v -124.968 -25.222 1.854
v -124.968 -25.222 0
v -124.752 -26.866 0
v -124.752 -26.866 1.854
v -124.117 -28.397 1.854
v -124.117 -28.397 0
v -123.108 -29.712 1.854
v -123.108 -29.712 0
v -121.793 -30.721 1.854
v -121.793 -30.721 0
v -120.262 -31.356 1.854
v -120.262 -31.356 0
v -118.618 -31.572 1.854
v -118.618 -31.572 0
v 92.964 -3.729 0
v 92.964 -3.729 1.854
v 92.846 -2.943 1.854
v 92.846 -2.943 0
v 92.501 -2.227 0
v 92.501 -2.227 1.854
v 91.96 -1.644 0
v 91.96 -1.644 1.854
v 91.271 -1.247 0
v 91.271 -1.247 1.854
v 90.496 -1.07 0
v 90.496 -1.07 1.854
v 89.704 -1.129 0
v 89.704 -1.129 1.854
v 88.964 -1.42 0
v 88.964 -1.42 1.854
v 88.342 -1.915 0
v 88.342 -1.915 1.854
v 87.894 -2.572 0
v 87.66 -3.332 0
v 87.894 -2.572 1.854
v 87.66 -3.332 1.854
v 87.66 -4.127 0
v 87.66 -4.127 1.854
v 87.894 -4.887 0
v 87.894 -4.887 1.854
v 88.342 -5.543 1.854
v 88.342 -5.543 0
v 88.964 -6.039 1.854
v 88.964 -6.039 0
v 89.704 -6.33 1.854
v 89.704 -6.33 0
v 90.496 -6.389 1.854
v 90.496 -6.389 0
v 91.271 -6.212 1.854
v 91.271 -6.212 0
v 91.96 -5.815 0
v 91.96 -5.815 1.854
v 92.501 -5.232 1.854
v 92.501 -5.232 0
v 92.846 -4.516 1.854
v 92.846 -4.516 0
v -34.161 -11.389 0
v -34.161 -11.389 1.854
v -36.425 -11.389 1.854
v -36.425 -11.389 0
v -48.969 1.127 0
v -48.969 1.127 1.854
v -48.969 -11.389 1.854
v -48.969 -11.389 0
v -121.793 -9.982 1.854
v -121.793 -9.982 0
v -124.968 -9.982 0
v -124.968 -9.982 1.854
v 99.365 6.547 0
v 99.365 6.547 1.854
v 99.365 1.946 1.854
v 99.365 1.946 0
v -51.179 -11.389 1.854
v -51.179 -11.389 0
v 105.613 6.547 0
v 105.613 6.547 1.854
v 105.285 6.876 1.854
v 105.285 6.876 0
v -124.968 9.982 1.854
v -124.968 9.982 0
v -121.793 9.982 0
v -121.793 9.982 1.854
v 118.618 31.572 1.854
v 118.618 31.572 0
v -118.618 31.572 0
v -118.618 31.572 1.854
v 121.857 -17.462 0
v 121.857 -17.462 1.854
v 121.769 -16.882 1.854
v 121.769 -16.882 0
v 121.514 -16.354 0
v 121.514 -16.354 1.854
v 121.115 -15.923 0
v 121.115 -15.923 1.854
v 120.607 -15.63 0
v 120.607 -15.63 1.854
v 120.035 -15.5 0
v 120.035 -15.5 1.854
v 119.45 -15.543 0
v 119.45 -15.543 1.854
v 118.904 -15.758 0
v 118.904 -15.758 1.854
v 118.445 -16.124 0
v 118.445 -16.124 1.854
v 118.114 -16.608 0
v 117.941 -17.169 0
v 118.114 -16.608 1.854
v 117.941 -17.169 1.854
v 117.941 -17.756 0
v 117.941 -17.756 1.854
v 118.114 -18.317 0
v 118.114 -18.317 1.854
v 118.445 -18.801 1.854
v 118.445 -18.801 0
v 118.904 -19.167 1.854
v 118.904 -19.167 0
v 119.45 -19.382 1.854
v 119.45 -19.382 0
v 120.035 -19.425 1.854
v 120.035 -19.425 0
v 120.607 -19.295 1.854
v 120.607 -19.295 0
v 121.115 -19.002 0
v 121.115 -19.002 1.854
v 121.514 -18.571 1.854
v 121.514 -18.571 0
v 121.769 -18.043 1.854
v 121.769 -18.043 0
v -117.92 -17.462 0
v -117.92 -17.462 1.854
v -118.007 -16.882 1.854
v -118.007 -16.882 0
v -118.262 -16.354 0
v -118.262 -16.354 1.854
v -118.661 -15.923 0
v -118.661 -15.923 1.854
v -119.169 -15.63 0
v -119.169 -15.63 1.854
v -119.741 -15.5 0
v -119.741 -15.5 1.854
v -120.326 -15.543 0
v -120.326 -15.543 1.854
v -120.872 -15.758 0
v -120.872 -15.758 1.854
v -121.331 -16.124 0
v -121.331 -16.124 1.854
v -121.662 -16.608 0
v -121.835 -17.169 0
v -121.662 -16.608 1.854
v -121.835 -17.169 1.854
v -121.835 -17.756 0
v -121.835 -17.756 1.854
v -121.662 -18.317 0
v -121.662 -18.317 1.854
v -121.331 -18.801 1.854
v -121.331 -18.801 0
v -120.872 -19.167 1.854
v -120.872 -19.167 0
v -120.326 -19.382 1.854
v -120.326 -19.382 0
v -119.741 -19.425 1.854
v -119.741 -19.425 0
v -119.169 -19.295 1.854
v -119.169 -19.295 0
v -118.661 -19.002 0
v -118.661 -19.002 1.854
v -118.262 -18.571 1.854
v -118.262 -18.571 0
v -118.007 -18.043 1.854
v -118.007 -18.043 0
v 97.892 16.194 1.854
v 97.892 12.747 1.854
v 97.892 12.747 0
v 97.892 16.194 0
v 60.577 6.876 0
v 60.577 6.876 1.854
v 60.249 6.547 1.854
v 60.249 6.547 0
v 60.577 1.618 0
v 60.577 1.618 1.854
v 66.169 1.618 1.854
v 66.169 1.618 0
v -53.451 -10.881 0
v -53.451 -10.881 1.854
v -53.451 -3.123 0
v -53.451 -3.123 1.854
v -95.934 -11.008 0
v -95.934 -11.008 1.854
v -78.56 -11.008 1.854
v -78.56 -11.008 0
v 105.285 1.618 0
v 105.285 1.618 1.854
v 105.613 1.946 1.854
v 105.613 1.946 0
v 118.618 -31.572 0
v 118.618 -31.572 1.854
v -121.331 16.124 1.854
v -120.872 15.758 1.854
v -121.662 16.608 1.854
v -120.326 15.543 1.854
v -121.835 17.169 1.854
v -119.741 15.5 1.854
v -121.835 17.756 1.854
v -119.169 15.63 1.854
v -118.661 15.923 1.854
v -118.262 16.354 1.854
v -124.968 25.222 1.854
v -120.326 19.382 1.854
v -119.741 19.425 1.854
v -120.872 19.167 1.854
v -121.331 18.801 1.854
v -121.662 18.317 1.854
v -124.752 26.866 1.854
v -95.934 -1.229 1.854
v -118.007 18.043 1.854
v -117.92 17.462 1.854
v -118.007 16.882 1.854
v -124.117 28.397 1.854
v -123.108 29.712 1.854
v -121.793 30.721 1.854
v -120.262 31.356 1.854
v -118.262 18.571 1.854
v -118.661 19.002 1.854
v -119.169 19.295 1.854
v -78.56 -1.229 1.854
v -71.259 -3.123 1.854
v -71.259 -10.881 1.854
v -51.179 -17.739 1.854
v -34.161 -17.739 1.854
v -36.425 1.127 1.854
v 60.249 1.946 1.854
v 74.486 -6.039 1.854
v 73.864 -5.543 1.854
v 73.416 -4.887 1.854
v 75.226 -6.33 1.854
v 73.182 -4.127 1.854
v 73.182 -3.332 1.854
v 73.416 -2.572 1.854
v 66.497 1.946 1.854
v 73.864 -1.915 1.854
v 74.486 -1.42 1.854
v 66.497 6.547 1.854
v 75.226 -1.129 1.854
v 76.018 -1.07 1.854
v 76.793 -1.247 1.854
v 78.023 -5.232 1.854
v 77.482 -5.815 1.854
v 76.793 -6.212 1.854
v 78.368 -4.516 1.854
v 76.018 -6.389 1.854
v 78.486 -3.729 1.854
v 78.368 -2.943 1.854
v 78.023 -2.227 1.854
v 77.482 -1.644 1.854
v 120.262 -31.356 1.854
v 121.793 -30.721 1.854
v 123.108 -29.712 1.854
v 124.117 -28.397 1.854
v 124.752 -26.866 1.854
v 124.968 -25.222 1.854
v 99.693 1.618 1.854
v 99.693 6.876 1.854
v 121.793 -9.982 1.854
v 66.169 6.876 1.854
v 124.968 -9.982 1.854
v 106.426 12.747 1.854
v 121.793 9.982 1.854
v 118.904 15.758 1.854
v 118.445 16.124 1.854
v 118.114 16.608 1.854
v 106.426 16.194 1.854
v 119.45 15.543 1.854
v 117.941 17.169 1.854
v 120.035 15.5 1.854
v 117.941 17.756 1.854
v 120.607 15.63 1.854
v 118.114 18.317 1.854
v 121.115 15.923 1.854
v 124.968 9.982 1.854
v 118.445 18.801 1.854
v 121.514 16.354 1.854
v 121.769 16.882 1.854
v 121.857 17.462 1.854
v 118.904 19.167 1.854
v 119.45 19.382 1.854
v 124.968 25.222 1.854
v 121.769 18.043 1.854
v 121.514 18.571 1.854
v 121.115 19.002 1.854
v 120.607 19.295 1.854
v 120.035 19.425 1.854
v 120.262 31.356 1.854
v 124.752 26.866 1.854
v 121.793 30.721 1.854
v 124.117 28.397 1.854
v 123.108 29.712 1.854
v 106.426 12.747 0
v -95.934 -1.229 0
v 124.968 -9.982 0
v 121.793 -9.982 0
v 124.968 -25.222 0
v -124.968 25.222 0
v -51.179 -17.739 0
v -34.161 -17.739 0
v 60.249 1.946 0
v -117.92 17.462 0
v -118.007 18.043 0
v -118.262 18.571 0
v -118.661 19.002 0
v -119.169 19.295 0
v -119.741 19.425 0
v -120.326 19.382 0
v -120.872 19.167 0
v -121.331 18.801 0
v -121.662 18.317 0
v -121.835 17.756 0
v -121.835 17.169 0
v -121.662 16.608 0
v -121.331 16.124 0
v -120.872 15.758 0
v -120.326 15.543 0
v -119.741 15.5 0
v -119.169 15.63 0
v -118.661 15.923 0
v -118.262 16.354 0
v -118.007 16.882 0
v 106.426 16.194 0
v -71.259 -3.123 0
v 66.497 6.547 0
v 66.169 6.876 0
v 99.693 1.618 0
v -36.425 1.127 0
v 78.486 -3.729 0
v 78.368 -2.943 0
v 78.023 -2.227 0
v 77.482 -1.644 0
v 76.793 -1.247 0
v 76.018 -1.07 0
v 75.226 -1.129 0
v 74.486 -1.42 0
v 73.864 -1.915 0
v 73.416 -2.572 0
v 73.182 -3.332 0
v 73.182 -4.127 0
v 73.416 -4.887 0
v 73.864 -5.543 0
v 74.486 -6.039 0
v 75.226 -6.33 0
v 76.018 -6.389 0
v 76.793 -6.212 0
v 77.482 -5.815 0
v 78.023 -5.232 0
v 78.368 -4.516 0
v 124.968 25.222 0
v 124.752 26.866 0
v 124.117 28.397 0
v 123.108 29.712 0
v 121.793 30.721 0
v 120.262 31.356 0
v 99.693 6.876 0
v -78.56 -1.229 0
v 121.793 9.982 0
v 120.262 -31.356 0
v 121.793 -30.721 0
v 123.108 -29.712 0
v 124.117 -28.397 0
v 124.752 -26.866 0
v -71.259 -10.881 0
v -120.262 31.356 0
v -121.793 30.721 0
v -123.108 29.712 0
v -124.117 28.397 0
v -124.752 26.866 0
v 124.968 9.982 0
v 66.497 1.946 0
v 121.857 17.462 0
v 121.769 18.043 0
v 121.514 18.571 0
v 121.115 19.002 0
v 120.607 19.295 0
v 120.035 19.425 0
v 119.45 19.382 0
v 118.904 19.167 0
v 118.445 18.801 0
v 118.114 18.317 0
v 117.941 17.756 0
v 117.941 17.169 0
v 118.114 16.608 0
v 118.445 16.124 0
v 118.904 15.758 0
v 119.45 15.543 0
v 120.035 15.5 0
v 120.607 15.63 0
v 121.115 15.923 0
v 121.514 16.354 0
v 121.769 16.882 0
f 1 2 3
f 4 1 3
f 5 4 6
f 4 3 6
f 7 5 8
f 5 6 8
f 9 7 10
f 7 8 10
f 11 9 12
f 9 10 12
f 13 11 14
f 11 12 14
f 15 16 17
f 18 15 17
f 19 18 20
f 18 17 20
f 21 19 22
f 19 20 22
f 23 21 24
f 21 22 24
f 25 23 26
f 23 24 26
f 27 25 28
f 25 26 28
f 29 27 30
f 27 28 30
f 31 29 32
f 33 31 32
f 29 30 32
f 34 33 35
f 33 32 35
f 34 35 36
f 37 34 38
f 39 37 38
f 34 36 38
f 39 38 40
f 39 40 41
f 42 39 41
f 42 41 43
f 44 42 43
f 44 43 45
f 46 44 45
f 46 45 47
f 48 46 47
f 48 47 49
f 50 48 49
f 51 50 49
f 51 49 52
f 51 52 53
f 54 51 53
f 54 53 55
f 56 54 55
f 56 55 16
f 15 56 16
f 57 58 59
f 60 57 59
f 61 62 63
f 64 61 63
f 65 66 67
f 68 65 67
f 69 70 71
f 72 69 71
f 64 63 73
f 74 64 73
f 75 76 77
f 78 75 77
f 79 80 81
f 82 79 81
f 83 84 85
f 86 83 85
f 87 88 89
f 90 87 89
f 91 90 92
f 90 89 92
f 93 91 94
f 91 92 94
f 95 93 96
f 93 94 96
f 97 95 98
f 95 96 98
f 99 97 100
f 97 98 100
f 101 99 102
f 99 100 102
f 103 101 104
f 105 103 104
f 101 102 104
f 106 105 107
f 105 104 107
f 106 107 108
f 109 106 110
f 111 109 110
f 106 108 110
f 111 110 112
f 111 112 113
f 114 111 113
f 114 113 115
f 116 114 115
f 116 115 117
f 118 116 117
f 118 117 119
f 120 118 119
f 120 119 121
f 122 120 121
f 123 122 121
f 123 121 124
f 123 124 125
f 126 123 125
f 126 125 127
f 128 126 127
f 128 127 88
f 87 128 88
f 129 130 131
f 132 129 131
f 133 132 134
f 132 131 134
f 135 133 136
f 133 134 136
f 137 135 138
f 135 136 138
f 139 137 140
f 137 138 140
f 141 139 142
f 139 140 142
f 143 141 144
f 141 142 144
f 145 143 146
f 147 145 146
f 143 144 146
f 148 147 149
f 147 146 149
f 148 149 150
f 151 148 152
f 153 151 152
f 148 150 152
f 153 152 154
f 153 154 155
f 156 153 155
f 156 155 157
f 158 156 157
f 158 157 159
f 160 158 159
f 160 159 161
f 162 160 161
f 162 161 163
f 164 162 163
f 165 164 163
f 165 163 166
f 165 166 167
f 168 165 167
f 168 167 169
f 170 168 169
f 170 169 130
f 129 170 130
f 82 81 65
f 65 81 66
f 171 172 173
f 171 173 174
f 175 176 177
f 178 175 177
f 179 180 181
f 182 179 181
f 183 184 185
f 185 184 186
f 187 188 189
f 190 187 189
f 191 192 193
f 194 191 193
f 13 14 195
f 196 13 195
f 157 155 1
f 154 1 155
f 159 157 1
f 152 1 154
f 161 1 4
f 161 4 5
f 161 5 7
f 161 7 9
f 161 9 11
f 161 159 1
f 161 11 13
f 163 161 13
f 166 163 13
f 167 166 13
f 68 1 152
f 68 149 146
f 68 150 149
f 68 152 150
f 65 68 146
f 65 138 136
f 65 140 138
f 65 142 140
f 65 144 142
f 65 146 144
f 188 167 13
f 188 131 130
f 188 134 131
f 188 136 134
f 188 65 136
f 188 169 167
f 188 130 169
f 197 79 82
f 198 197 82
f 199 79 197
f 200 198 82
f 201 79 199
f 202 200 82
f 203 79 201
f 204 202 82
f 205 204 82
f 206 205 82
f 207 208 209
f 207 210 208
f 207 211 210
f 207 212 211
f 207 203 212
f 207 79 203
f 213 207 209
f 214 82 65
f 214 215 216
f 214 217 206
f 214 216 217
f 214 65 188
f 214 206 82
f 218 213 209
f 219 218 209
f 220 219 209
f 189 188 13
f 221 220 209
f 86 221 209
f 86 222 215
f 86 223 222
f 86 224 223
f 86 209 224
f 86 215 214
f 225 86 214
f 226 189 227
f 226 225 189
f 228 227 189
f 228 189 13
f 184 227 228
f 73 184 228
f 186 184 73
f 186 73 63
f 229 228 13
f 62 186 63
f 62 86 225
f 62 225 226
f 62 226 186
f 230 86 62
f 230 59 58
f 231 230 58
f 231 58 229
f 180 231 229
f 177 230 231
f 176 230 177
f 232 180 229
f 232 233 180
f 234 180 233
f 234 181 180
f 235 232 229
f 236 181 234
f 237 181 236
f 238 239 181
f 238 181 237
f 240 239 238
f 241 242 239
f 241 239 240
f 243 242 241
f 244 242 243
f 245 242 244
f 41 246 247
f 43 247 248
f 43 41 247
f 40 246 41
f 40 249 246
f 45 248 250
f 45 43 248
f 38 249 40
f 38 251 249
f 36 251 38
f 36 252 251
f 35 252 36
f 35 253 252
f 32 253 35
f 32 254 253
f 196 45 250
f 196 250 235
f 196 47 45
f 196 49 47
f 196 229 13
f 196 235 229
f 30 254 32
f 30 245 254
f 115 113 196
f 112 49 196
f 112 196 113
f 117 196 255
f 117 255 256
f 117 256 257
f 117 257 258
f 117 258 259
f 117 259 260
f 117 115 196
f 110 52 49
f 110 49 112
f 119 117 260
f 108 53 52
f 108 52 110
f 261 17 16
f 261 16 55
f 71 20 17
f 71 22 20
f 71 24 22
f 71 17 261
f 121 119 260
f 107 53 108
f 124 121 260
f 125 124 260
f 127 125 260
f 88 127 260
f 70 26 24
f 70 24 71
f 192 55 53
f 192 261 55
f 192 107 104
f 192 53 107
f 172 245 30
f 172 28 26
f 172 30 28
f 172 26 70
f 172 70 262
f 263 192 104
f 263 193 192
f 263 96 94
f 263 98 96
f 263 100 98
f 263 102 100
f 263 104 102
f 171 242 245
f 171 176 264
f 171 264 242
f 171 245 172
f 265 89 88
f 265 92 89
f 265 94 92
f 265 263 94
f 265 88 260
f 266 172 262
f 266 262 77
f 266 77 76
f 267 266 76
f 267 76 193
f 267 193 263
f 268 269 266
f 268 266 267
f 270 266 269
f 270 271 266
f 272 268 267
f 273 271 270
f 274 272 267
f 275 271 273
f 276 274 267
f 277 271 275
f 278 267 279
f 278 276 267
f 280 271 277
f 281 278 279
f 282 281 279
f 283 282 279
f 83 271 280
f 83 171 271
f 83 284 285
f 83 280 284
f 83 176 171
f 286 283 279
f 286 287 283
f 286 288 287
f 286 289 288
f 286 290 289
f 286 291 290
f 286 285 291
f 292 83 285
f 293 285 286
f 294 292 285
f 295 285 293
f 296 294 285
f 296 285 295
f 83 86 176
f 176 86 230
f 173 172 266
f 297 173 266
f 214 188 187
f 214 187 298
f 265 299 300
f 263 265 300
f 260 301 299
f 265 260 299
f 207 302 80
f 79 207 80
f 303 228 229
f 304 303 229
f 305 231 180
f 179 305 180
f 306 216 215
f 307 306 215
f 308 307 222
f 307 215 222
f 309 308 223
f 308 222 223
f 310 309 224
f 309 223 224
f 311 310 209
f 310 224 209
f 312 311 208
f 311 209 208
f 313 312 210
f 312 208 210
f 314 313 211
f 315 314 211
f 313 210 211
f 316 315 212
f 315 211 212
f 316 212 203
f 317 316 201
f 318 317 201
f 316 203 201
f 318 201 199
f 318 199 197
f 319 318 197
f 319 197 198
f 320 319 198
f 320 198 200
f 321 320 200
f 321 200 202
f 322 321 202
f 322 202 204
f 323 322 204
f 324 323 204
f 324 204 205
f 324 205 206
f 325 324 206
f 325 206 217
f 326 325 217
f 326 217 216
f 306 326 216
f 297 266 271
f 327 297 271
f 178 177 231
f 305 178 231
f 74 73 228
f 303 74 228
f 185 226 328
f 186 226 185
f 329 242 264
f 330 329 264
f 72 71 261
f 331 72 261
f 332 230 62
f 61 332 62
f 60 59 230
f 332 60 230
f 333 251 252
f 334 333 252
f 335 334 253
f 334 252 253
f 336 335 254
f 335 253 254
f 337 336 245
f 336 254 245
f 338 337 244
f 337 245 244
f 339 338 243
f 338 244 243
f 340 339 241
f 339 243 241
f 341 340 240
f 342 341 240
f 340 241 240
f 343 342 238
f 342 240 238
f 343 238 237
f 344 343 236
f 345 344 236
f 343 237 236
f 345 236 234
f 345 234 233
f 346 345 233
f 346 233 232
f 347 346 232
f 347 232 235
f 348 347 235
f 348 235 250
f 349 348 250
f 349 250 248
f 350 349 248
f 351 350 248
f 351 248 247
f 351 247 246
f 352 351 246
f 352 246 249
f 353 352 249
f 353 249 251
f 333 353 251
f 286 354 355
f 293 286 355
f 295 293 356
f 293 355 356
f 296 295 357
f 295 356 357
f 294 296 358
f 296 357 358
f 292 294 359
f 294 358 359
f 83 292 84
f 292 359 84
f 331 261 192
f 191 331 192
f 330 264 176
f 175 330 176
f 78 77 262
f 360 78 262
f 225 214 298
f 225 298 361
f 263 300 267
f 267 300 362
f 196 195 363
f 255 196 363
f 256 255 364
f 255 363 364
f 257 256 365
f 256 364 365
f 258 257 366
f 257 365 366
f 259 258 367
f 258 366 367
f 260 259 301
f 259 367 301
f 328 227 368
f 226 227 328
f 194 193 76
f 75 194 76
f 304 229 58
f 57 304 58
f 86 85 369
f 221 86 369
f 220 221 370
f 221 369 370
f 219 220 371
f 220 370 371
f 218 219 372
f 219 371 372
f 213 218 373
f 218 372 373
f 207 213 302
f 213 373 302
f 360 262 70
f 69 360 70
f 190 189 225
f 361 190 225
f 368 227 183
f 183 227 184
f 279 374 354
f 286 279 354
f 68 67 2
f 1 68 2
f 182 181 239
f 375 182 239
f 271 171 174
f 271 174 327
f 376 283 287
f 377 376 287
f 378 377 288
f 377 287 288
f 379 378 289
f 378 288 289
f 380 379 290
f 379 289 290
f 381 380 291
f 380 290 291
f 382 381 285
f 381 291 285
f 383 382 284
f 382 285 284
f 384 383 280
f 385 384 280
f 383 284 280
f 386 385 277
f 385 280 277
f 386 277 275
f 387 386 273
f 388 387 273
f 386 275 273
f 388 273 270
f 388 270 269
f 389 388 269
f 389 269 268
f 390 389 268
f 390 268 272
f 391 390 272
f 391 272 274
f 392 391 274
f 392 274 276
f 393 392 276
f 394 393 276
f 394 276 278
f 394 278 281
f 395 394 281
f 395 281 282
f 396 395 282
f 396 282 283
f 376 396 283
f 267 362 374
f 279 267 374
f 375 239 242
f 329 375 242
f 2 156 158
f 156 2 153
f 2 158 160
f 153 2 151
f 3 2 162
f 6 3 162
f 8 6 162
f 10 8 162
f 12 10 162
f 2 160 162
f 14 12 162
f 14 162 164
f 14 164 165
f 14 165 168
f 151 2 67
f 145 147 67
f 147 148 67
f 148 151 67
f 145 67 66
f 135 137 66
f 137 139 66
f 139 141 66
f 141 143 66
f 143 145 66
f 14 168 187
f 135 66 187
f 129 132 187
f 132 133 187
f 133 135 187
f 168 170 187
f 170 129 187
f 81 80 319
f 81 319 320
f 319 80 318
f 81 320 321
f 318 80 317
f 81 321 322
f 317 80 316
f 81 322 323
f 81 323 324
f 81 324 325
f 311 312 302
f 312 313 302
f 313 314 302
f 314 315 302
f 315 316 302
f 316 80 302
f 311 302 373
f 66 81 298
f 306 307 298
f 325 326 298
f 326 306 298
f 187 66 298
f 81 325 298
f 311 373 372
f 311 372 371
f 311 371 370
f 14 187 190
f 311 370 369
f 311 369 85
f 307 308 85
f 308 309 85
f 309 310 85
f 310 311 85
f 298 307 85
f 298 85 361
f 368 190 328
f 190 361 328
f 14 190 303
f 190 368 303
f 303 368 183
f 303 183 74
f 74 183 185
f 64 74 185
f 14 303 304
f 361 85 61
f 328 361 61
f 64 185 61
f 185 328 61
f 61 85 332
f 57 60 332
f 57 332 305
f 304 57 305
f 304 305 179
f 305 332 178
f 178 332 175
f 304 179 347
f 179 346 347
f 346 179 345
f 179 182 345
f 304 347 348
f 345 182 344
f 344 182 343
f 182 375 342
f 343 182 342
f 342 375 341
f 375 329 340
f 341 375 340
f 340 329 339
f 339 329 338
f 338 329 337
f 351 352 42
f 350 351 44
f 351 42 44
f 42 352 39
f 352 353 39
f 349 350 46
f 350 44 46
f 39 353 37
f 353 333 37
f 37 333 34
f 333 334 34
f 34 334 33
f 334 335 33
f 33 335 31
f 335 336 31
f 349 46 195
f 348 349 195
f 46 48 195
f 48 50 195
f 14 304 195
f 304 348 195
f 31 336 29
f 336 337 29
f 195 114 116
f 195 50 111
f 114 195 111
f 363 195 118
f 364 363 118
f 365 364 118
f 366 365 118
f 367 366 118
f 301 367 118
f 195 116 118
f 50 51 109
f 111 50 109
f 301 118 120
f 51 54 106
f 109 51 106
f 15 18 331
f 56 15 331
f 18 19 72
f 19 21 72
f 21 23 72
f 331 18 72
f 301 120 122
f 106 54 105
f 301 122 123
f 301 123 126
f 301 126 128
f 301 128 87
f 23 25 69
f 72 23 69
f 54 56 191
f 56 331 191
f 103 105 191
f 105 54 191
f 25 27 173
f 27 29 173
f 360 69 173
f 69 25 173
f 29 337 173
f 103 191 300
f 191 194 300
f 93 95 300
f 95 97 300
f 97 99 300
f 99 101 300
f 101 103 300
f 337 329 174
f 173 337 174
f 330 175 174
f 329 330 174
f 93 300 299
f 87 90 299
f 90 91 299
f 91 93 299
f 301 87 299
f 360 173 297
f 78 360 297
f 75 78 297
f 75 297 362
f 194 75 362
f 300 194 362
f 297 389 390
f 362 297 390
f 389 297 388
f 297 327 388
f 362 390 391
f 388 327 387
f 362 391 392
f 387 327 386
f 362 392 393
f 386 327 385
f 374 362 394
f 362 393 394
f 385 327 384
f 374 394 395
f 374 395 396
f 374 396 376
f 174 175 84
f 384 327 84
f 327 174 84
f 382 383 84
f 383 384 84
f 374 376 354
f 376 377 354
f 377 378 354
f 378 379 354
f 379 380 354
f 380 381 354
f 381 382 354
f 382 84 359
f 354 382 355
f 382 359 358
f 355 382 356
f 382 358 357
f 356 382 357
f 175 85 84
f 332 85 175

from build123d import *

# Parameters (mm, degrees)
MAINBODY_DEPTH    = 1.8542
SKETCH3_R         = 1.9685
MOUNTHOLES_DEPTH  = 129.907885308
PANELCUTOUT_REACH = 130.908
SKETCH4_R         = 2.667
SKETCH4_W         = 8.534035503
SKETCH4_H         = 3.447371256
SKETCH4_W_2       = 17.373674213
SKETCH4_H_2       = 9.779
SKETCH4_W_3       = 17.808
SKETCH4_H_3       = 7.758


with BuildPart() as part:
    # Sketch2 → MainBody (new body)
    with BuildSketch(Plane.XY):
        with BuildLine():
            Line((118.618, 31.5722), (-118.618, 31.5722))
            ThreePointArc((-118.618, 31.5722), (-123.108128061, 29.712328061), (-124.968, 25.2222))
            Line((-124.968, 25.2222), (-124.968, 9.9822))
            Line((-124.968, 9.9822), (-121.793, 9.9822))
            Line((-121.793, 9.9822), (-121.793, -9.9822))
            Line((-121.793, -9.9822), (-124.968, -9.9822))
            Line((-124.968, -9.9822), (-124.968, -25.2222))
            ThreePointArc((-124.968, -25.2222), (-123.108128061, -29.712328061), (-118.618, -31.5722))
            Line((-118.618, -31.5722), (118.618, -31.5722))
            ThreePointArc((118.618, -31.5722), (123.108128061, -29.712328061), (124.968, -25.2222))
            Line((124.968, -25.2222), (124.968, -9.9822))
            Line((124.968, -9.9822), (121.793, -9.9822))
            Line((121.793, -9.9822), (121.793, 9.9822))
            Line((121.793, 9.9822), (124.968, 9.9822))
            Line((124.968, 9.9822), (124.968, 25.2222))
            ThreePointArc((124.968, 25.2222), (123.108128061, 29.712328061), (118.618, 31.5722))
        make_face()
    extrude(amount=MAINBODY_DEPTH)

    # Sketch3 → MountHoles (cut, through all)
    with BuildSketch(Plane.XY.offset(1.8542)):
        with Locations((-119.888, 17.4625)):
            Circle(SKETCH3_R)
        with Locations((119.888, 17.4625)):
            Circle(SKETCH3_R)
        with Locations((119.888, -17.4625)):
            Circle(SKETCH3_R)
        with Locations((-119.888, -17.4625)):
            Circle(SKETCH3_R)
    extrude(amount=-MOUNTHOLES_DEPTH, mode=Mode.SUBTRACT)

    # Sketch4 → PanelCutout (cut, up to next)
    with BuildSketch(Plane.XY.offset(1.8542), mode=Mode.PRIVATE) as panelcutout_sk1:
        with Locations((90.297, -3.729450093)):
            Circle(SKETCH4_R)
    panelcutout_tool1 = extrude(panelcutout_sk1.sketch, amount=-PANELCUTOUT_REACH, mode=Mode.PRIVATE) & part.part
    # Sketch4 → PanelCutout (cut, up to next)
    with BuildSketch(Plane.XY.offset(1.8542), mode=Mode.PRIVATE) as panelcutout_sk2:
        with Locations((75.819, -3.729450093)):
            Circle(SKETCH4_R)
    panelcutout_tool2 = extrude(panelcutout_sk2.sketch, amount=-PANELCUTOUT_REACH, mode=Mode.PRIVATE) & part.part
    # Sketch4 → PanelCutout (cut, up to next)
    with BuildSketch(Plane.XY.offset(1.8542), mode=Mode.PRIVATE) as panelcutout_sk3:
        with Locations((102.1588002, 14.470550015)):
            Rectangle(SKETCH4_W, SKETCH4_H)
    panelcutout_tool3 = extrude(panelcutout_sk3.sketch, amount=-PANELCUTOUT_REACH, mode=Mode.PRIVATE) & part.part
    # Sketch4 → PanelCutout (cut, up to next)
    with BuildSketch(Plane.XY.offset(1.8542), mode=Mode.PRIVATE) as panelcutout_sk4:
        with Locations((-87.246762894, -6.11895)):
            Rectangle(SKETCH4_W_2, SKETCH4_H_2)
    panelcutout_tool4 = extrude(panelcutout_sk4.sketch, amount=-PANELCUTOUT_REACH, mode=Mode.PRIVATE) & part.part
    # Sketch4 → PanelCutout (cut, up to next)
    with BuildSketch(Plane.XY.offset(1.8542), mode=Mode.PRIVATE) as panelcutout_sk5:
        with Locations((-62.3548, -7.00245)):
            Rectangle(SKETCH4_W_3, SKETCH4_H_3)
    panelcutout_tool5 = extrude(panelcutout_sk5.sketch, amount=-PANELCUTOUT_REACH, mode=Mode.PRIVATE) & part.part
    # Sketch4 → PanelCutout (cut, up to next)
    with BuildSketch(Plane.XY.offset(1.8542), mode=Mode.PRIVATE) as panelcutout_sk6:
        Polygon((-36.424791576, -11.38945), (-36.424791576, 1.12655), (-48.968754151, 1.12655), (-48.968754151, -11.38945), (-51.1788, -11.38945), (-51.1788, -17.73945), (-34.1608, -17.73945), (-34.1608, -11.38945), align=None)
    panelcutout_tool6 = extrude(panelcutout_sk6.sketch, amount=-PANELCUTOUT_REACH, mode=Mode.PRIVATE) & part.part
    # Sketch4 → PanelCutout (cut, up to next)
    with BuildSketch(Plane.XY.offset(1.8542), mode=Mode.PRIVATE) as panelcutout_sk7:
        Polygon((60.2488, 6.547255322), (60.2488, 1.946245078), (60.577194878, 1.6178502), (66.168805122, 1.6178502), (66.4972, 1.946245078), (66.4972, 6.547255322), (66.168805122, 6.8756502), (60.577194878, 6.8756502), align=None)
    panelcutout_tool7 = extrude(panelcutout_sk7.sketch, amount=-PANELCUTOUT_REACH, mode=Mode.PRIVATE) & part.part
    # Sketch4 → PanelCutout (cut, up to next)
    with BuildSketch(Plane.XY.offset(1.8542), mode=Mode.PRIVATE) as panelcutout_sk8:
        Polygon((99.3648, 6.547255322), (99.3648, 1.946245078), (99.693194878, 1.6178502), (105.284805122, 1.6178502), (105.6132, 1.946245078), (105.6132, 6.547255322), (105.284805122, 6.8756502), (99.693194878, 6.8756502), align=None)
    panelcutout_tool8 = extrude(panelcutout_sk8.sketch, amount=-PANELCUTOUT_REACH, mode=Mode.PRIVATE) & part.part
    add(panelcutout_tool1.solids().sort_by_distance((90.297, -3.72945, 1.8542))[0], mode=Mode.SUBTRACT)
    add(panelcutout_tool2.solids().sort_by_distance((75.819, -3.72945, 1.8542))[0], mode=Mode.SUBTRACT)
    add(panelcutout_tool3.solids().sort_by_distance((102.1588, 14.47055, 1.8542))[0], mode=Mode.SUBTRACT)
    add(panelcutout_tool4.solids().sort_by_distance((-87.246763, -6.11895, 1.8542))[0], mode=Mode.SUBTRACT)
    add(panelcutout_tool5.solids().sort_by_distance((-62.3548, -7.00245, 1.8542))[0], mode=Mode.SUBTRACT)
    add(panelcutout_tool6.solids().sort_by_distance((-42.685776, -8.977195, 1.8542))[0], mode=Mode.SUBTRACT)
    add(panelcutout_tool7.solids().sort_by_distance((63.373, 4.24675, 1.8542))[0], mode=Mode.SUBTRACT)
    add(panelcutout_tool8.solids().sort_by_distance((102.489, 4.24675, 1.8542))[0], mode=Mode.SUBTRACT)


solid = part.part
